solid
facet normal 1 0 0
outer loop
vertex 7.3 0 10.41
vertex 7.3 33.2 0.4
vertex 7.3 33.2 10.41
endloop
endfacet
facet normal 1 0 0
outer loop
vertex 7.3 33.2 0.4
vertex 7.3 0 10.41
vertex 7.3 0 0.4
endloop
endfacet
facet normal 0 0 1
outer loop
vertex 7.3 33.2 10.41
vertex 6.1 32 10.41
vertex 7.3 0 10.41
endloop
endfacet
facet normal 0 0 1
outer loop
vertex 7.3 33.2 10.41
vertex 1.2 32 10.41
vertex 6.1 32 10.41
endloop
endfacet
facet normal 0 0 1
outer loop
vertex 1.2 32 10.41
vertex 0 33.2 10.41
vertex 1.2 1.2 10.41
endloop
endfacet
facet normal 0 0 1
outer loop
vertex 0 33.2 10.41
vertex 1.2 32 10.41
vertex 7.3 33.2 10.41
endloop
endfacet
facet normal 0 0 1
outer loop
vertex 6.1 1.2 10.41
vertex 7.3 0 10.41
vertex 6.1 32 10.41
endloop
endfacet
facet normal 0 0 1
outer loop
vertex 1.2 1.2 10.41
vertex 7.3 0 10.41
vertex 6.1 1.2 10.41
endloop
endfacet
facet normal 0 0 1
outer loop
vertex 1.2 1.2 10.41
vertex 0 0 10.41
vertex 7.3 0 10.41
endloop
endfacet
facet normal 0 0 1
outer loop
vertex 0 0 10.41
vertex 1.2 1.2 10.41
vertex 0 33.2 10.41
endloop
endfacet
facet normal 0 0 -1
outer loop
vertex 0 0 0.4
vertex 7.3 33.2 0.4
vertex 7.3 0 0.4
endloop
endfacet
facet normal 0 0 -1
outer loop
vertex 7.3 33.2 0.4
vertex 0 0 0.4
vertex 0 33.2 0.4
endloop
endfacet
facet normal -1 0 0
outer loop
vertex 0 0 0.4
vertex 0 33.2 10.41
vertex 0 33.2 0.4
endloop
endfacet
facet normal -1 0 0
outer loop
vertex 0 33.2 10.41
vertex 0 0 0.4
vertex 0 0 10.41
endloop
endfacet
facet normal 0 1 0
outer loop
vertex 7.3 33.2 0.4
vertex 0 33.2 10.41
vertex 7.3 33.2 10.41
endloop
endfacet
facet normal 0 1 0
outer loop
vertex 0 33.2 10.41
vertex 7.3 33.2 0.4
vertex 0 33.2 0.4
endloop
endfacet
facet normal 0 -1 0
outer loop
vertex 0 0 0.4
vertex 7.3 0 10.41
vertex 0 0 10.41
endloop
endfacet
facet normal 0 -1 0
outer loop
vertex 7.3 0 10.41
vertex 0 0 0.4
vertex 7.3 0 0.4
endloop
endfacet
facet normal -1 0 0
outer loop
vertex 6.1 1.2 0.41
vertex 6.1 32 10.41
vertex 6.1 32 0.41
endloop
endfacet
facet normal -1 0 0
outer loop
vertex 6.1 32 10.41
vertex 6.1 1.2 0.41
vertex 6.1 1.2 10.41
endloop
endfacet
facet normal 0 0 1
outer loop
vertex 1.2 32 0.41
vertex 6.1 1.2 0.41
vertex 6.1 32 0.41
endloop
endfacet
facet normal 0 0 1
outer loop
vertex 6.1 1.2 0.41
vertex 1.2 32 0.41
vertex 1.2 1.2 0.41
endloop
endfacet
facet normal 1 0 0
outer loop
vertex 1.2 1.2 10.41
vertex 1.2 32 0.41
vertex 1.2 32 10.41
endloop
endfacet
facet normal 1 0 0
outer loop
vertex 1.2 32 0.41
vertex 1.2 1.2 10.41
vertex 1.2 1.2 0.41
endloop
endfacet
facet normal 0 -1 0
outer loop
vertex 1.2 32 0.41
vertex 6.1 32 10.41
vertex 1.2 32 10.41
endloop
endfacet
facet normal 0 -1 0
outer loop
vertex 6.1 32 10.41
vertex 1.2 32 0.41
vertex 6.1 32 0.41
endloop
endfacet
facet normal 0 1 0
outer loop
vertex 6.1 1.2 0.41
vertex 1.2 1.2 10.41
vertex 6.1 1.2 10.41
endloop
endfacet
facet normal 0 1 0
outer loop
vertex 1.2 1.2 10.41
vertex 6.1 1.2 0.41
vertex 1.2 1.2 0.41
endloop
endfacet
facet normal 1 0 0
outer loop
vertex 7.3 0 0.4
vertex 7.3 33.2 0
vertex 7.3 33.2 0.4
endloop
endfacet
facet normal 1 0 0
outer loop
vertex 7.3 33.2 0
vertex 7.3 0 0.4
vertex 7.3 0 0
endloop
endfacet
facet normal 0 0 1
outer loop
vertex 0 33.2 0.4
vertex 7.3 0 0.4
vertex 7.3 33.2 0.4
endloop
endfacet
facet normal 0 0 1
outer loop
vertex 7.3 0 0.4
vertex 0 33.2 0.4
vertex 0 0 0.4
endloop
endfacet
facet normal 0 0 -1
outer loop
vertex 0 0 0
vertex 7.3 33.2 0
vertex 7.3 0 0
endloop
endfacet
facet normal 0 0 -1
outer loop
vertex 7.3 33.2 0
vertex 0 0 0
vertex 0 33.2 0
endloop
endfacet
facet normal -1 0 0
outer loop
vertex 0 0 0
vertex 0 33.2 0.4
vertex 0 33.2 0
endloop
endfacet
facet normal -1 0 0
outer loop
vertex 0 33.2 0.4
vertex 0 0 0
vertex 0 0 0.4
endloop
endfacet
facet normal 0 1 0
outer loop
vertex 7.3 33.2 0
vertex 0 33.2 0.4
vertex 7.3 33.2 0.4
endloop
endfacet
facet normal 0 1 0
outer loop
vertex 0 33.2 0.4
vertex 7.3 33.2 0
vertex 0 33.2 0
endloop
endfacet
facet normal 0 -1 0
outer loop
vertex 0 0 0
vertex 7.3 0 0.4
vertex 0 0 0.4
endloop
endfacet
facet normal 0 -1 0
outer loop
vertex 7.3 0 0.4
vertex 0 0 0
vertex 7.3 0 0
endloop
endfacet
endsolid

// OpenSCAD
// file: ../../Base/Rotation.scad
// Fischertechnik Box Foundation
// Geometry Helpers Rotation

include <PlacementOptions.scad>

// getRotatedSpace(space, rotation=NoRotation)
// Rotates the space dependent on the specified rotation

function getRotatedSpace(space, rotation=NoRotation) = [
    (rotation == Rotate90 || rotation == Rotate270) ? space.y : space.x,
    (rotation == Rotate90 || rotation == Rotate270) ? space.x : space.y
];

// Rotates the given space around the fixed left lower corner
// space = the space the children needs as width/depth list [width,depth]
// rotation = 0 Rotate0 degrees, 1 Rotate90 degrees, 2 Rotate180 degrees, 3 Rotate270 degrees (equivalent to -90)

module RotateFix(space, rotation=NoRotation) {
    dy = (rotation == Rotate0 || rotation == Rotate270) ? 0 :
        (rotation == Rotate90) ? space.x :
        space.y;
    dx = (rotation < Rotate180) ? 0 :
        (rotation == Rotate180) ? space.x :
        space.y;
    
    translate([dx, dy, 0])
        rotate([0, 0, rotations[rotation]])
            children();
}
// file: ../../Base/Alignment.scad
// Fischertechnik Box Foundation
// Geometry Helpers Alignment

include <PlacementOptions.scad>

// getAlignedX(elementWidth, spaceWidth, align=AlignRight, offset=0)
// Gets the aligned X offset of an element with the given
// width in the given space.
// elementWidth = The width of the element to positon
// spaceWidth = The space where the element should be aligned
// align = 0 AlignLeft, 1 AlignCenter, 2 AlignRight
// offset = an optional offset from the aligned position. When
// aligned left or centered, then positive values are in X direction.
// When aligned right then positive values are in negative X direction.

function getAlignedX(elementWidth, spaceWidth, align=AlignRight, offset=0) =
    (align == AlignLeft) ?
        offset :
        ((align == AlignCenter) ?
        (spaceWidth - elementWidth)/2 + offset :
        spaceWidth - offset - elementWidth);

// getAlignedY(elementDepth, spaceDepth, align=AlignTop, offset=0)
// Gets the aligned Y offset of an element with the given
// depth in the given space.
// elementDepth = The depth of the element to positon
// spaceDepth = The space where the element should be aligned
// align = 0 AlignBottom, 1 AlignCenter, 2 AlignTop
// offset = an optional offset from the aligned position. When
// aligned bottom or centered, then positive values are in Y direction.
// When aligned top then positive values are in negative Y direction.

function getAlignedY(elementDepth, spaceDepth, align=AlignTop, offset=0) =
    (align == AlignBottom) ?
        offset :
        ((align == AlignCenter) ?
        (spaceDepth - elementDepth)/2 + offset :
        spaceDepth - offset - elementDepth);
// file: ../../Base/Boxes.scad
// Fischertechnik Box Foundation
// Pre-designed Boxes

use <Constants.scad>

include <PlacementOptions.scad>

box190Width = 190;
box190Depth = 130;
box130Width = 130;
box130Depth = 95;

// Values are from an original ec3 box
topBottomDifference = 1.5;
outerHeight = 40;
innerHeight = 38.2;
baseThickness = outerHeight - innerHeight;
stackExcess = 5.7;
radius = 3.5;
wallThickness = 1.5;
tolerance = 0.2;
stackOffset = innerHeight - stackExcess;

boxUsageHeight = stackOffset;
boxWallThickness = wallThickness;
boxBaseThickness = baseThickness;
boxWebWidth = 3.0;

// getBoxWallThickness()
// Gets the wall thickness of a Fischertechnik Box
function getBoxWallThickness() = boxWallThickness;

// getBoxUsageHeight()
// Gets the usable height of a Fischertechnik box
function getBoxUsageHeight() = boxUsageHeight;

// getBoxInnerHeight()
// Gets the inner height of a Fischertechnik box, including the stack excess
function getBoxInnerHeight() = innerHeight;

// getBoxBaseThickness()
// Gets the thickness of the Fischertechnik box base.
function getBoxBaseThickness() = boxBaseThickness;

// getBoxWebWidth()
// Gets the width of a box web
function getBoxWebWidth() = boxWebWidth;

// getBox190Space()
// Gets the usable inner space of a Box 190 as an x/y-list
function getBox190Space() = [
    box190Width - 2*getBoxWallThickness() - topBottomDifference, 
    box190Depth - 2*getBoxWallThickness() - topBottomDifference ];

// BoxBase(width, depth)
// Creates an empty stackable Fischertechnik compatible box
// width = Outer width of the box (190, 130, ...)
// depth = Outer depth of the box (130, 95, ...)

module BoxBase(width, depth, height=outerHeight) {    
    thinPlate = 0.01;

    innerHeight = height - baseThickness;    
    
    module BodyPlate(width, depth) {
        translate([radius, radius])
        hull() {
            w = width-2*radius;
            d = depth-2*radius;
            cube([w, d, thinPlate]);
            cylinder(thinPlate, r=radius, $fn=getFragments());
            translate([w, 0])
                cylinder(thinPlate, r=radius, $fn=getFragments());
            translate([w, d])
                cylinder(thinPlate, r=radius, $fn=getFragments());
            translate([0, d])
                cylinder(thinPlate, r=radius, $fn=getFragments());
        }
    }
    
    module Body(tolerance=tolerance) {
        hull() {
            // Bottom with tolerance to fit into the original boxes when stacked
            translate([-wallThickness+tolerance, -wallThickness+tolerance, -baseThickness])
                BodyPlate(width-topBottomDifference-2*tolerance, depth-topBottomDifference-2*tolerance);
            
            // Top
            translate([-wallThickness-topBottomDifference/2, -wallThickness-topBottomDifference/2, innerHeight-thinPlate])
                BodyPlate(width, depth);
         }
    }

    module Cutoff() {
        hull() {
            coWidth = width - 2*wallThickness;
            coDepth = depth - 2*wallThickness;
            
            // Bottom
            BodyPlate(coWidth-topBottomDifference, coDepth-topBottomDifference);

            // Top
            translate([-topBottomDifference/2, -topBottomDifference/2, innerHeight+thinPlate]) 
                BodyPlate(coWidth, coDepth);
        }
    }
    
    difference() {        
        Body();
        Cutoff();
        stackOffset = innerHeight - stackExcess;
        translate([0, 0, stackOffset + baseThickness])
            Body(tolerance=0);
    }
}

// Creates the Fischertechnik empty box 130x190 mm and places it at position 0,0
// 190x130 are the outer sizes, the inner space is slightly smaller. Use getBox190Space() to get the inner sizes.
// The box is positioned that the usable inner space is at the 0,0,0 position. The

module Box190() {
    BoxBase(box190Width, box190Depth);
}

// Gets the usable inner space of a Box 130 as an x/y-list
function getBox130Space() = [
    box130Width - 2*getBoxWallThickness() - topBottomDifference, 
    box130Depth - 2*getBoxWallThickness() - topBottomDifference ];

// Creates the Fischertechnik empty box 95x130 mm and places it at position 0,0
// 190x130 are the outer sizes, the inner space is slightly smaller. Use getBox190Space() to get the inner sizes.
// The box is positioned that the usable inner space is at the 0,0,0 position. The

module Box130() {
    BoxBase(box130Width, box130Depth);
}

// Creates a web at the specified box walls
// corner 0 = LowerLeft, 1 = UpperLeft, 2 = UpperRight, 3 = LowerRight
// side 0 = LeftOfCorner, 1 = RightOfCorner
// distance = Distance in mm from the corner
// boxSpace = inner width and depth of the box (default: Box 190)
// webWidth = length of the web (default is 3 mms)
// webThickness = thickness of the web (default is 1 mm)

module BoxWeb(corner, side, distance, boxSpace=getBox190Space(), webWidth=getBoxWebWidth(), webThickness=1.0) {
    sink = getBoxWallThickness()/2;

    width = (corner % 2 == 0) ? 
            (side == LeftOfCorner ? webWidth : webThickness) :
            (side == LeftOfCorner ? webThickness : webWidth);

    depth = (corner % 2 == 0) ? 
            (side == RightOfCorner ? webWidth : webThickness) :
            (side == RightOfCorner ? webThickness : webWidth);
    
    xDiff = corner == LowerLeft ? 
                (side == LeftOfCorner ? -sink : distance) :
            (corner == UpperLeft ?                
                (side == LeftOfCorner ? distance : -sink) :
            (corner == UpperRight ?
                (side == LeftOfCorner ? boxSpace.x-webWidth+sink : boxSpace.x-distance-webThickness) :
                (side == LeftOfCorner ? boxSpace.x-distance-webThickness: boxSpace.x-webWidth+sink)));

    yDiff = corner == LowerLeft ? 
                (side == RightOfCorner ? -sink : distance) :
            (corner == UpperLeft ?
                (side == RightOfCorner ? boxSpace.y-distance : boxSpace.y-webWidth+sink) :
            (corner == UpperRight ?
                (side == RightOfCorner ? boxSpace.y-webWidth+sink : boxSpace.y-distance) :
                (side == RightOfCorner ? distance : -sink)));
    
    translate([xDiff, yDiff, -getExcess()])
        cube([width, depth, boxUsageHeight + 2*getExcess()]);
}
// file: ../../Base/PlacementOptions.scad
// Fischertechnik Box Foundation
// Placement Options

// Alignment
NoAlign = 0;
AlignLeft = 1;
AlignBottom = 2;
AlignCenter = 3;
AlignRight = 4;
AlignTop = 5;

// Element rotation degree steps
rotations = [0, -90, -180, -270];

// Rotation
NoRotation = 0;
Rotate0 = 0;
Rotate90 = 1;
Rotate180 = 2;
Rotate270 = 3;

// Docking (seen from above)
NoDock = -1;
DockLeft = 0;
DockTop = 1;
DockRight = 2;
DockCorner = 2;
DockBottom = 3;

// Web corners
LowerLeft = 0;
UpperLeft = 1;
UpperRight = 2;
LowerRight = 3;

// Web position relative to corner
LeftOfCorner = 0;
RightOfCorner = 1;
// file: ../../Base/Placement.scad
// Fischertechnik Box Foundation
// Geometry Helpers Placement

use <Constants.scad>
use <Alignment.scad>
use <Rotation.scad>
use <Boxes.scad>

include <PlacementOptions.scad>

// Place(x=0, y=0, elementSpace=[0,0], alignX=AlignLeft, alignY=AlignBottom, rotation=Rotate0, boxSpace=getBox190Space())
// Places the child at the specified position
// y = Y-Position. This is a relative position when an X aligment is specified.
// x = X-Position. This is a relative position when an Y aligment is specified.
// elementSpace = space of the element to be placed [x,y]
// alignX = -1=NoAlign, 0 AlignLeft, 1 AlignCenter, 3 AlignRight (elementSpace and boxSpace required!)
// alignY = -1=NoAlign, 2 AlignBottom, 1 AlignCenter, 4 AlignTop (elementSpace and boxSpace required!)
// rotation = 0 Rotate0 0 degrees, 1 Rotate90 90 degrees, 
// 2 Rotate180 180 degrees, 3 Rotate270 270 degrees (equivalent to -90)
// boxSpace = Inner space of the box where the placement occurs [x,y] - default is Box 190x130 inner space

module Place(x=0, y=0, elementSpace=[0,0], 
  alignX=AlignLeft, alignY=AlignBottom, 
  rotation=NoRotation, boxSpace=getBox190Space()) {

    module Position(x, y, space, rotation=Rotate0) {
        translate([x, y, 0])
            RotateFix(space, rotation)
                children();
    }

    space = getRotatedSpace(elementSpace, rotation);
    alignedX = getAlignedX(space.x, boxSpace.x, alignX, x);
    alignedY = getAlignedY(space.y, boxSpace.y, alignY, y);
    Position(alignedX, alignedY, elementSpace, rotation)
        children();
}

// Center(space=getBox130Space(), elementSpace=[0,0])
// space = Space where the children is centered. For cylinder use centered=true and no elementSpace.
// elementSpace = space of the element to be centered [x,y]

module Center(space=getBox190Space(), elementSpace=[0,0]) {
    Place(elementSpace=elementSpace, boxSpace=space, alignX=AlignCenter, alignY=AlignCenter)
        children();
}

// CenterHorizontal(width=0, y=0, offset=0, space=getBox130Space())
// width = Width of the element to be placed.
// y = Y position of the element
// offset = Offset from the center position (negative will be left of the center)
// space = Space where the element is placed

module CenterHorizontal(width=0, y=0, offset=0, space=getBox190Space()) {
    Place(x=offset, y=y, elementSpace=[width, 0], boxSpace=space, alignX=AlignCenter)
        children(0);
}

// CenterVertical(depth=0, x=0, offset=0, space=getBox130Space())
// depth = Depth of the element to be placed.
// x = X position of the element
// offset = Offset from the center position (negative will be down of the center)
// space = Space where the element is placed

module CenterVertical(depth=0, x=0, offset=0, space=getBox190Space()) {
    Place(x=x, y=offset, elementSpace=[0, depth], boxSpace=space, alignY=AlignCenter)
        children(0);
}

// getIsVertical(align)
// True if the specified alignment needs a vertical orientation for a divider (AlignRight, AlignLeft)

function getIsVertical(align) = (align == AlignRight || align == AlignLeft);

// getIsHorizontal(align)
// True if the specified alignment needs a horizontal orientation for a divider (AlignTop, AlignBottom)

function getIsHorizontal(align) = (align == AlignTop || align == AlignBottom);
// file: ../../Elements/AxisClip10.scad
// Fischertechnik Box Library
// Axis for clip 10
// 31023

use <../ModelBase/Simple.scad>
use <../Base/Constants.scad>

width = 12;
depth = 12;
height = 23;
upperDiameter = 3.6;
clipHeight = 10;

// getAxisClip10Space()
// Gets the space of a frame for a clip 10 with spring ring (mot2)

function getAxisClip10Space() = [width, depth, height];

// AxisClip10(height, clipHeight)
// Axis for clip 10 with spring ring (mot2)
// height = Height of the complete axis
// clipHeight = Height of the rt for the clip (standard is 10, in mot3 its only 7)

module AxisClip10(height=height, clipHeight=clipHeight) {
    LeveledAxisWithSpace(height, height-clipHeight, getAxisClip10Space(), diameter=upperDiameter);
}

// Tests
color("lightgray")
AxisClip10();
// file: ../../Base/Constants.scad
// Fischertechnik Box Foundation
// Constants

// Constant values necessary for multiple elements

// Base constants
dividerThickness = 1.2;
excess = 0.01;
fragments = 90;
tolerance = 0.8;

// Gets the thickness of a divider 
function getDividerThickness() = dividerThickness;

// Gets the excess that is used to merge walls into each other
function getExcess() = excess;

// Gets amount of fragments of a cylinder
function getFragments() = fragments;

// Gets the inner tolerance of a frame to each side
function getTolerance() = tolerance;


// Fischertechnik specific constants
axisDiameter = 4;
axisBottomDiameter = axisDiameter + 1;
standardEdgeDistance = 2.5;
standardWebDistance = 11.5;
standardCornerLength = 15;
tubeWallFactor = 0.8;
smallPartsFrameHeight = 20;

// Gets axis diameter
function getAxisDiameter() = axisDiameter;

// Gets axis bottom diameter for thicker part at the bottom
function getAxisBottomDiameter() = axisBottomDiameter;

// gets the standard distance to the wall of the box for dockable frames with webs
function getStandardEdgeDistance() = standardEdgeDistance;

// gets the standard distance of each web to the corner of the dockable frame
function getStandardWebDistance() = standardWebDistance;

// gets the standard length of the corner walls of a dockable frame
function getStandardCornerLength() = standardCornerLength;

// gets the wall thickness of a tube.
function getTubeWallThickness() = tubeWallFactor * getDividerThickness();

// gets the frame height for docked small parts boxes.
function getSmallPartsFrameHeight() = smallPartsFrameHeight;
// file: ../../Elements/FrameFlatPiece30.scad
// Fischertechnik Box Library
// Frame for Flat Pieces 30
// 31013

use <../Base/Constants.scad>
use <../ModelBase/Complex.scad>

size = 30;

// getFrameFlatPiece30Space(count)
// count = count of pieces in X direction
// Gets the space for a frame for flat pieces 30.

function getFrameFlatPiece30Space(count=1) = getFrameFlatPieceVolume(count, size);

// FrameFlatPiece30(count)
// count = Count of flat pieces 30 in X direction

module FrameFlatPiece30(count=1) {  
    FrameFlatPiece(count, size);
}

// Tests
color("lightgray") {
FrameFlatPiece30();
}
// file: ../TestPrint.scad
// 3D Print Test Base

use <../Base/Constants.scad>

use <../Elements/AxisClip10.scad>

module TestPrint(elementSpace) {
    cube([elementSpace.x, elementSpace.y, 0.4]);
    translate([0,0,0.4+getExcess()]) {
        children();
    }
}

TestPrint(getAxisClip10Space())
    AxisClip10();
// main file
// 3D Print Test
// FrameFlatPiece30

use <../TestPrint.scad>
use <../../Elements/FrameFlatPiece30.scad>

TestPrint(getFrameFlatPiece30Space())
    FrameFlatPiece30();
